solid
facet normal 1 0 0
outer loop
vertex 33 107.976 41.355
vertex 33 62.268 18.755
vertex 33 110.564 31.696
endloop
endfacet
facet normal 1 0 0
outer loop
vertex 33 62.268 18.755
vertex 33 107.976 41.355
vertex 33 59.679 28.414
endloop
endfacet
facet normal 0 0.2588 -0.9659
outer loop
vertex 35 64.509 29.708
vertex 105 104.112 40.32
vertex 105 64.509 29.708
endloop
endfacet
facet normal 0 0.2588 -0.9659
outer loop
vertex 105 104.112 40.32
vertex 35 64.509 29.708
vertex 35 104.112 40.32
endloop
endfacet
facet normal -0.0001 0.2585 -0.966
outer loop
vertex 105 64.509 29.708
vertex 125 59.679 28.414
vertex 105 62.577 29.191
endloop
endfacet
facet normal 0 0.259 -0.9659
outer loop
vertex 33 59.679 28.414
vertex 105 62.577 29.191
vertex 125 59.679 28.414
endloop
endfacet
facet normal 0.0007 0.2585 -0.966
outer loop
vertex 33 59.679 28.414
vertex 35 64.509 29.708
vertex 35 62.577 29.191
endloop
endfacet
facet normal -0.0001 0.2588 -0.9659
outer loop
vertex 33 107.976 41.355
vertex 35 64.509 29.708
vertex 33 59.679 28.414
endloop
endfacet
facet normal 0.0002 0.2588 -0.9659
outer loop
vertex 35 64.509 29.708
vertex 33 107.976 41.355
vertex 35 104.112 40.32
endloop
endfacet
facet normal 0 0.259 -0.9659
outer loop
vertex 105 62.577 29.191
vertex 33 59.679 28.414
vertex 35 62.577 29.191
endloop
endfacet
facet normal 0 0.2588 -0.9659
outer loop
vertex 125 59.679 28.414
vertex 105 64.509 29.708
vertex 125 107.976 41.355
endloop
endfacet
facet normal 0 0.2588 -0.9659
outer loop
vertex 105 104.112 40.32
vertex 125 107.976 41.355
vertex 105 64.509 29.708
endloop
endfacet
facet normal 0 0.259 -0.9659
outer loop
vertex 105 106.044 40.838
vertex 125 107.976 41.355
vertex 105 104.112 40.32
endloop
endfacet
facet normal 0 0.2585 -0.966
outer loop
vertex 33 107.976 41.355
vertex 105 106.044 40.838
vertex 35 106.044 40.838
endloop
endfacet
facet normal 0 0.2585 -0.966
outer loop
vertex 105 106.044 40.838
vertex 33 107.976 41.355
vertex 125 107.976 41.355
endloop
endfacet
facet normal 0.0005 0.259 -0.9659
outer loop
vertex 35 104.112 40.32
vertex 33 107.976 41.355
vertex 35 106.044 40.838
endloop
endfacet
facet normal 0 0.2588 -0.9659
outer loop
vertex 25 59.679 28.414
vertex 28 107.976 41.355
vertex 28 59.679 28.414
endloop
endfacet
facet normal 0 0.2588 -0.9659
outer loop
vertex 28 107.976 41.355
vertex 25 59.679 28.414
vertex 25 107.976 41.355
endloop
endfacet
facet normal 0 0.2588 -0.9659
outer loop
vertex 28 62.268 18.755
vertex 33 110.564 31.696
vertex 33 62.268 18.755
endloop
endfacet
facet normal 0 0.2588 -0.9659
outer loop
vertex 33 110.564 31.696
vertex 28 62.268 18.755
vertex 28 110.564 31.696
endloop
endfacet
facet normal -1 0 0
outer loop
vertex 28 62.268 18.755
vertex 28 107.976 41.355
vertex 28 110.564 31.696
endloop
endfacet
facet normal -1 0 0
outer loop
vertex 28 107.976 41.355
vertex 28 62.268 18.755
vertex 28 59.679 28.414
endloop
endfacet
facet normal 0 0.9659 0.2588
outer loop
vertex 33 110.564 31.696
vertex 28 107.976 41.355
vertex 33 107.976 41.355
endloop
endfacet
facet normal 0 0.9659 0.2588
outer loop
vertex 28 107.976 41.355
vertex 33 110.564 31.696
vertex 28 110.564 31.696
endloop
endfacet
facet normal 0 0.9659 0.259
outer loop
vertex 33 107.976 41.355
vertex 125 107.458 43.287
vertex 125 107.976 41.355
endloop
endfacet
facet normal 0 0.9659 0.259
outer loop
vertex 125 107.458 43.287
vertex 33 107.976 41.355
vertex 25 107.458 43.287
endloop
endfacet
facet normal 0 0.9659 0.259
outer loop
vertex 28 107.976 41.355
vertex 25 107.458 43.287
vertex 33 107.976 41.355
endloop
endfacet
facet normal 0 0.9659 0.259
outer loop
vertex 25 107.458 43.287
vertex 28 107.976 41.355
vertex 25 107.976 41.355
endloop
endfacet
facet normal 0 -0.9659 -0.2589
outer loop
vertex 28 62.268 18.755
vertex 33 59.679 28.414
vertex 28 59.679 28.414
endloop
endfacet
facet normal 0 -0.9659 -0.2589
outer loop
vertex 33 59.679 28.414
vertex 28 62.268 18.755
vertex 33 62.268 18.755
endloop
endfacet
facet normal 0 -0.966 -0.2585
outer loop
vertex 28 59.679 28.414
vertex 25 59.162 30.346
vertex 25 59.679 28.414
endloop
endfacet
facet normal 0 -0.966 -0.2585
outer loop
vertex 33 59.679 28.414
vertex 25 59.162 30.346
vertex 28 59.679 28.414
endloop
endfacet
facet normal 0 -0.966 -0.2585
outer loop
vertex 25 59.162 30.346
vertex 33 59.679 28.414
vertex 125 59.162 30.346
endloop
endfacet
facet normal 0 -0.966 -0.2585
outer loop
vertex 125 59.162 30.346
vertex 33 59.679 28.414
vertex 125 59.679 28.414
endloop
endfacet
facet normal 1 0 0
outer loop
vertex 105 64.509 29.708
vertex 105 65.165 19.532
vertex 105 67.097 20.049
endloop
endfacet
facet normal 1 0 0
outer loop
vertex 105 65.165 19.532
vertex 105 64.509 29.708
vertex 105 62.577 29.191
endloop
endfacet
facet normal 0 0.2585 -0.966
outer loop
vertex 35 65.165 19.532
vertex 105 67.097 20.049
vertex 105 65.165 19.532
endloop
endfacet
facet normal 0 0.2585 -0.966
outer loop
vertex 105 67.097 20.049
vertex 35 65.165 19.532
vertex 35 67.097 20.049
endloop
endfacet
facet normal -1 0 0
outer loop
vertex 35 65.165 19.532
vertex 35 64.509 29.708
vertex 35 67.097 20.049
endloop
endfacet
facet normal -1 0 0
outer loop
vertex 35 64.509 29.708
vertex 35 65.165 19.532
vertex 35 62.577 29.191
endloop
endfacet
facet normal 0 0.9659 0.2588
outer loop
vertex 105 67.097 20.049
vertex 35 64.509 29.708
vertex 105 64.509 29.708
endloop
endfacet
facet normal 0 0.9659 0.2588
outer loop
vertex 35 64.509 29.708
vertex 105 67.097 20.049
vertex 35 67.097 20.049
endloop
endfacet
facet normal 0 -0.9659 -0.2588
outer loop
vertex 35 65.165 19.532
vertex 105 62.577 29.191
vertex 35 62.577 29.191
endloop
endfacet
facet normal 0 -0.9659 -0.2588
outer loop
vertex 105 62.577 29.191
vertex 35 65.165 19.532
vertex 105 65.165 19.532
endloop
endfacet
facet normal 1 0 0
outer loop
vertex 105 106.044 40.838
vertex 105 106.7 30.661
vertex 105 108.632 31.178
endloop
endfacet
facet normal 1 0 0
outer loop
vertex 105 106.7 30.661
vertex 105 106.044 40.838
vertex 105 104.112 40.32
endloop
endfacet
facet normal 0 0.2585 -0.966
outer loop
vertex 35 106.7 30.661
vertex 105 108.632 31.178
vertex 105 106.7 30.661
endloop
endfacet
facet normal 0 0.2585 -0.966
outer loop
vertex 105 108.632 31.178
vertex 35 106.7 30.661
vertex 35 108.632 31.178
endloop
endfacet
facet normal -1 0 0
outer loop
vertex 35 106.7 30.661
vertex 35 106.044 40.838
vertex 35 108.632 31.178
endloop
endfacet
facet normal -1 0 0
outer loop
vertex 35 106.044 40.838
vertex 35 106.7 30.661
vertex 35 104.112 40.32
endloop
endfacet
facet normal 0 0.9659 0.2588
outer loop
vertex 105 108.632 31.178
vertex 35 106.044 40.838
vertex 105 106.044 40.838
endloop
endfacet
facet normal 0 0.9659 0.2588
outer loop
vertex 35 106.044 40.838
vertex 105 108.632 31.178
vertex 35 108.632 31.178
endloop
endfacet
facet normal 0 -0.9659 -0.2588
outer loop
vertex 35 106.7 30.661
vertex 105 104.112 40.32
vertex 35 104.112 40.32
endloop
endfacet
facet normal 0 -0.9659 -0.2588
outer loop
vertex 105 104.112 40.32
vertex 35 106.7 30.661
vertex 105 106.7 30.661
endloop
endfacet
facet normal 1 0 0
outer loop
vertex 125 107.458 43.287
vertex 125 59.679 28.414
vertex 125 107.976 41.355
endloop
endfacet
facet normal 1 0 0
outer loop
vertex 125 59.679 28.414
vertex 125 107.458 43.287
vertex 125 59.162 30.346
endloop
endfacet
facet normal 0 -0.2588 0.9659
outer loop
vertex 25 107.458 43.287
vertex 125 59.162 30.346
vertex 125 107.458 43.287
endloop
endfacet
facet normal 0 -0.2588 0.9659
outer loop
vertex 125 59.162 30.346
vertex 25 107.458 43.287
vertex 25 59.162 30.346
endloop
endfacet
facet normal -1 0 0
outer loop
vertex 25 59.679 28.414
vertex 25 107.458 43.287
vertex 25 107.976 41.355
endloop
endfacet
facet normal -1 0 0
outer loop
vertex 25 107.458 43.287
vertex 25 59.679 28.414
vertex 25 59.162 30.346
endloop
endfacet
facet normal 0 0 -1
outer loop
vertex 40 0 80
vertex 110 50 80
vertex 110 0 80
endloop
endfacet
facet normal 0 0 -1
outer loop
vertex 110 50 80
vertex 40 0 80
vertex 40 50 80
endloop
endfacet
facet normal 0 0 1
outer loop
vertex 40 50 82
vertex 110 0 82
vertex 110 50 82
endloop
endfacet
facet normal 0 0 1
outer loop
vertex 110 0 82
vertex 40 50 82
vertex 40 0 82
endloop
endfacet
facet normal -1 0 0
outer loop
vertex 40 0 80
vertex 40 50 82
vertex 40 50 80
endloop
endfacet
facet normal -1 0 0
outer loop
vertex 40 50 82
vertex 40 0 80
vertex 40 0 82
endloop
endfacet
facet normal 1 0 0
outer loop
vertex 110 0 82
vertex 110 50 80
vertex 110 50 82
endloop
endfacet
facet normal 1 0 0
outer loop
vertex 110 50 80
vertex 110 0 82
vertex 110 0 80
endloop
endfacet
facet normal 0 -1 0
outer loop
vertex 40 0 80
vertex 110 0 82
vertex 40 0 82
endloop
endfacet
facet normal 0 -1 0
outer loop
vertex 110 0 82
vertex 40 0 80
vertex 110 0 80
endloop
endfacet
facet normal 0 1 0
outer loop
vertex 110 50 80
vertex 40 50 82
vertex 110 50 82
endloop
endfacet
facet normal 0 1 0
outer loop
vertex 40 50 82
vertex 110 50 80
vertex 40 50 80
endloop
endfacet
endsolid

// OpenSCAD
module arduino()
{
    color("blue")
    cube (size=[100,50,2]);
    color("black")
    translate([0,0,-10])
    {
        translate([3,0,0])
    cube (size=[5,50,10]);
        translate([10,3,0])
    cube (size=[70,2,10]);
        translate([10,46,0])
    cube (size=[70,2,10]);
    }
}

//cube (size=[150,150,2]);

module heart()
{
    color("red")
    linear_extrude(height = 2, center = false, convexity = 10)
    {
import (file = "pcb/aux/heart.dxf", layer = "0");
//import (file = "aux/heart.dxf", layer = "gambe");
    }
        
translate([25,65,12])
    arduino();

}

module stand()
{
    translate([-168,0,0])
    color("green")
    linear_extrude(height = 2, center = false, convexity = 10)
    {
import (file = "pcb/aux/heart.dxf", layer = "stand");
    }
    
    translate([80,0,-35])
    cube(size=[2,50,70]);
}

rotate([15,0,0]) heart();
translate([75,0,0]) rotate([0,-90,0]) stand();
